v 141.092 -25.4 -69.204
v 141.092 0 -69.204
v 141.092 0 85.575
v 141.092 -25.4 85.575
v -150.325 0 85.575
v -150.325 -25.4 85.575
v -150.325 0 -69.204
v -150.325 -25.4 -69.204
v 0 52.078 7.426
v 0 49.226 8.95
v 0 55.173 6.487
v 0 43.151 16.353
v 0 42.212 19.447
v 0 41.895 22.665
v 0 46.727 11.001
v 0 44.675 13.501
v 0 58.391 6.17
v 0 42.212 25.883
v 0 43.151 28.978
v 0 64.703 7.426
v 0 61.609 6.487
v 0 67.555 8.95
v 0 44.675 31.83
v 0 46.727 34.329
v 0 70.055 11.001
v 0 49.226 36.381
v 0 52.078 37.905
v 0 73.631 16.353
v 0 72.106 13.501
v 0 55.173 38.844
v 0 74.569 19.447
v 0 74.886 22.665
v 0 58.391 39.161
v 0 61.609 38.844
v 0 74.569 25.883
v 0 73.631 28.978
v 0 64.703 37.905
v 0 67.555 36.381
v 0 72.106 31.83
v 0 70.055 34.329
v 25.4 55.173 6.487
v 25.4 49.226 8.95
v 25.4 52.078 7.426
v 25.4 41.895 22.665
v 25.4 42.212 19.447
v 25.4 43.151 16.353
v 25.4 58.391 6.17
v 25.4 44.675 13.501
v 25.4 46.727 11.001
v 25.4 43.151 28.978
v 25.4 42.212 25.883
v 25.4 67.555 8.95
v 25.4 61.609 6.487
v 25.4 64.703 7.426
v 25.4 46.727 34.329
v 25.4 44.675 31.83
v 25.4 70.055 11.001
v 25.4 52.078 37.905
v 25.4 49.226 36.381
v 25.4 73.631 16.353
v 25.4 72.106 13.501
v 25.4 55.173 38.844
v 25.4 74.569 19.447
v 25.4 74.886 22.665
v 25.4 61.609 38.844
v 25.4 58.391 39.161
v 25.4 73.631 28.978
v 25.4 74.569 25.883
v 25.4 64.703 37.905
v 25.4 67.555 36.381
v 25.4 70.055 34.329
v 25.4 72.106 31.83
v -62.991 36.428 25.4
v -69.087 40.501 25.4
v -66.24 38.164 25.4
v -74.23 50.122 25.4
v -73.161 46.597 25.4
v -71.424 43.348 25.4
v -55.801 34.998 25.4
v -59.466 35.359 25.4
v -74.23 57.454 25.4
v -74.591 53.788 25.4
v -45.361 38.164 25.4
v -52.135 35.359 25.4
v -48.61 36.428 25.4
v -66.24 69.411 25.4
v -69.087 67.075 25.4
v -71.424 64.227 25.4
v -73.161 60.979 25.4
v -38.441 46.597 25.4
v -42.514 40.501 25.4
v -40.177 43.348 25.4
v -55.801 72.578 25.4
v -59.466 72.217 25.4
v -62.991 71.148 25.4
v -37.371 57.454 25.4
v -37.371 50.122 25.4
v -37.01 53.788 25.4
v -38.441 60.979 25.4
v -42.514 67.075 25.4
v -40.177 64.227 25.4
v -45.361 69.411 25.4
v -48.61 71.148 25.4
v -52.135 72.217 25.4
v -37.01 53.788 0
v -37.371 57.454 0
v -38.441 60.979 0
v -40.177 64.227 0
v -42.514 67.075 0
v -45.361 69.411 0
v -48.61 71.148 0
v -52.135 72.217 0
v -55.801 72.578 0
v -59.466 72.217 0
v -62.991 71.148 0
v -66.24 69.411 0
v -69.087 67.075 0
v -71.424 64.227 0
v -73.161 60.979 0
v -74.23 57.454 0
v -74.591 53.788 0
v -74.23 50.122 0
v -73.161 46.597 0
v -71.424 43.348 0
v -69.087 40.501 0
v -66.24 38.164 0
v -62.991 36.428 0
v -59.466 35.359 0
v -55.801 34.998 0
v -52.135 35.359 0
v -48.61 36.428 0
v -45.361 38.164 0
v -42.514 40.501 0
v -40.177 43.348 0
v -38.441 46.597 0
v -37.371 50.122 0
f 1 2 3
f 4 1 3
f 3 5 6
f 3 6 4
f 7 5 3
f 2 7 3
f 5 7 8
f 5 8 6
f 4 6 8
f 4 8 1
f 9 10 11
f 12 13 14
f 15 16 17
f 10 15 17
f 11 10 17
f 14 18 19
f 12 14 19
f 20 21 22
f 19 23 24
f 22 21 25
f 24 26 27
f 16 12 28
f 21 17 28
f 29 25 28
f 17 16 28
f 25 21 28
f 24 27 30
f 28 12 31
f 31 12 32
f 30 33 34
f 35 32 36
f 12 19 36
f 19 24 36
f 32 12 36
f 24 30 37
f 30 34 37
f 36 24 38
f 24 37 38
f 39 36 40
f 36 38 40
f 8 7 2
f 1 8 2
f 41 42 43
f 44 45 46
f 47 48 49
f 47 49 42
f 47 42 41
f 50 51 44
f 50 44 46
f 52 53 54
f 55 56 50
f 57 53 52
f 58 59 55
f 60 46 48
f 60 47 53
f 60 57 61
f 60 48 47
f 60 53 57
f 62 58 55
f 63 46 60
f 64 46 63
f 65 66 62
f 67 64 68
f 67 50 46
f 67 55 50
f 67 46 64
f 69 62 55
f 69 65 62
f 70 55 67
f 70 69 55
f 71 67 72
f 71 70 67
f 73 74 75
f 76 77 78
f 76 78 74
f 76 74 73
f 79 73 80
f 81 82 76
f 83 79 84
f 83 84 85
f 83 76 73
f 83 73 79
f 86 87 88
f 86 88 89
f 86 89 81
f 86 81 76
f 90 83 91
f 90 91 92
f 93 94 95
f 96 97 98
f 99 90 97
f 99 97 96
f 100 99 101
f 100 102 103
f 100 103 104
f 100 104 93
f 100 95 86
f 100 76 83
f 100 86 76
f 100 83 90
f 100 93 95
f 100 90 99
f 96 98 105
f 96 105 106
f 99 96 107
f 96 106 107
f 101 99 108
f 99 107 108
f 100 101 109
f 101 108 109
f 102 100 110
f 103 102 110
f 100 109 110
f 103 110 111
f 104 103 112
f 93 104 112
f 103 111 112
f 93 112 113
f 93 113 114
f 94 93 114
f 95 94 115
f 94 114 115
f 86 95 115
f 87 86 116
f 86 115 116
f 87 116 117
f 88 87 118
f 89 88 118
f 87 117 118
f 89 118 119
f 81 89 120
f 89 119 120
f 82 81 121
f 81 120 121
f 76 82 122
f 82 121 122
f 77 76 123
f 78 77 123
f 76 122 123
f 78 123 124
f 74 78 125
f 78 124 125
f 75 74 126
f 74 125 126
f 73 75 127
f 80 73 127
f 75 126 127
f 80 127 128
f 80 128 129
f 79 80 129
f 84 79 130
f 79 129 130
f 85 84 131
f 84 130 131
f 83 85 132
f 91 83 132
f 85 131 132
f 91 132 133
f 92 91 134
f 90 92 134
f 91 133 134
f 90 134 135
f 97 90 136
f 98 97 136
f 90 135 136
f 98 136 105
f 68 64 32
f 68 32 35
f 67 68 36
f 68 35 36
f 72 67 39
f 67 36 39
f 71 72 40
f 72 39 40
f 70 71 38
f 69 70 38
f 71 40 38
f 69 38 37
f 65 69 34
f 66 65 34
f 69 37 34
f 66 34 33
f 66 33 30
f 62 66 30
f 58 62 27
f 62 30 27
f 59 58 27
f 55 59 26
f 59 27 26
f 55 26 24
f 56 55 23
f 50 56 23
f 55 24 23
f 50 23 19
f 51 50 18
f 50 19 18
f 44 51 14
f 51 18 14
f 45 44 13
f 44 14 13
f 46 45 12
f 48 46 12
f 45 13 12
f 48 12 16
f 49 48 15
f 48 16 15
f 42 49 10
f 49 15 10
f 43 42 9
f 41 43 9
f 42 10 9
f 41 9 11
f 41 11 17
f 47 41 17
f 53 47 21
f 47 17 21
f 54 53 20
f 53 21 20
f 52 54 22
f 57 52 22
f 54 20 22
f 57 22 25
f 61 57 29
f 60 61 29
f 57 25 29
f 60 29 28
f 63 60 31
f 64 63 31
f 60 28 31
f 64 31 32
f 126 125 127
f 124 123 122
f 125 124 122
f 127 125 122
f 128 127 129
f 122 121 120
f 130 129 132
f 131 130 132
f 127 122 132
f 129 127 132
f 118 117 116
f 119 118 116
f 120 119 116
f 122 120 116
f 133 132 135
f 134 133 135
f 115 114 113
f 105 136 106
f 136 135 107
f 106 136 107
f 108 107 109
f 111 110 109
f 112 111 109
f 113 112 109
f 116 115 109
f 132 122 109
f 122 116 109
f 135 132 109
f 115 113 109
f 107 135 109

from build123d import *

# Parameters (mm, degrees)
F0_W     = 291.417375
F0_H     = 154.779598
F1_DEPTH = 25.4
F2_R     = 16.495445
F3_DEPTH = 25.4
F4_R     = 18.790255
F5_DEPTH = 25.4


with BuildPart() as f1:
    # F0 (on Front) → F1 (new body)
    with BuildSketch(Plane.XZ):
        with Locations((-4.616522, 8.185603)):
            Rectangle(F0_W, F0_H)
    extrude(amount=F1_DEPTH)


with BuildPart() as f3:
    # F2 (on Right) → F3 (new body)
    with BuildSketch(Plane.YZ):
        with Locations((58.390807, 22.665327)):
            Circle(F2_R)
    extrude(amount=F3_DEPTH)


with BuildPart() as f5:
    # F4 (on Top) → F5 (new body)
    with BuildSketch(Plane.XY):
        with Locations((-55.800684, 53.78779)):
            Circle(F4_R)
    extrude(amount=F5_DEPTH)


solid = Compound([f1.part, f3.part, f5.part])
